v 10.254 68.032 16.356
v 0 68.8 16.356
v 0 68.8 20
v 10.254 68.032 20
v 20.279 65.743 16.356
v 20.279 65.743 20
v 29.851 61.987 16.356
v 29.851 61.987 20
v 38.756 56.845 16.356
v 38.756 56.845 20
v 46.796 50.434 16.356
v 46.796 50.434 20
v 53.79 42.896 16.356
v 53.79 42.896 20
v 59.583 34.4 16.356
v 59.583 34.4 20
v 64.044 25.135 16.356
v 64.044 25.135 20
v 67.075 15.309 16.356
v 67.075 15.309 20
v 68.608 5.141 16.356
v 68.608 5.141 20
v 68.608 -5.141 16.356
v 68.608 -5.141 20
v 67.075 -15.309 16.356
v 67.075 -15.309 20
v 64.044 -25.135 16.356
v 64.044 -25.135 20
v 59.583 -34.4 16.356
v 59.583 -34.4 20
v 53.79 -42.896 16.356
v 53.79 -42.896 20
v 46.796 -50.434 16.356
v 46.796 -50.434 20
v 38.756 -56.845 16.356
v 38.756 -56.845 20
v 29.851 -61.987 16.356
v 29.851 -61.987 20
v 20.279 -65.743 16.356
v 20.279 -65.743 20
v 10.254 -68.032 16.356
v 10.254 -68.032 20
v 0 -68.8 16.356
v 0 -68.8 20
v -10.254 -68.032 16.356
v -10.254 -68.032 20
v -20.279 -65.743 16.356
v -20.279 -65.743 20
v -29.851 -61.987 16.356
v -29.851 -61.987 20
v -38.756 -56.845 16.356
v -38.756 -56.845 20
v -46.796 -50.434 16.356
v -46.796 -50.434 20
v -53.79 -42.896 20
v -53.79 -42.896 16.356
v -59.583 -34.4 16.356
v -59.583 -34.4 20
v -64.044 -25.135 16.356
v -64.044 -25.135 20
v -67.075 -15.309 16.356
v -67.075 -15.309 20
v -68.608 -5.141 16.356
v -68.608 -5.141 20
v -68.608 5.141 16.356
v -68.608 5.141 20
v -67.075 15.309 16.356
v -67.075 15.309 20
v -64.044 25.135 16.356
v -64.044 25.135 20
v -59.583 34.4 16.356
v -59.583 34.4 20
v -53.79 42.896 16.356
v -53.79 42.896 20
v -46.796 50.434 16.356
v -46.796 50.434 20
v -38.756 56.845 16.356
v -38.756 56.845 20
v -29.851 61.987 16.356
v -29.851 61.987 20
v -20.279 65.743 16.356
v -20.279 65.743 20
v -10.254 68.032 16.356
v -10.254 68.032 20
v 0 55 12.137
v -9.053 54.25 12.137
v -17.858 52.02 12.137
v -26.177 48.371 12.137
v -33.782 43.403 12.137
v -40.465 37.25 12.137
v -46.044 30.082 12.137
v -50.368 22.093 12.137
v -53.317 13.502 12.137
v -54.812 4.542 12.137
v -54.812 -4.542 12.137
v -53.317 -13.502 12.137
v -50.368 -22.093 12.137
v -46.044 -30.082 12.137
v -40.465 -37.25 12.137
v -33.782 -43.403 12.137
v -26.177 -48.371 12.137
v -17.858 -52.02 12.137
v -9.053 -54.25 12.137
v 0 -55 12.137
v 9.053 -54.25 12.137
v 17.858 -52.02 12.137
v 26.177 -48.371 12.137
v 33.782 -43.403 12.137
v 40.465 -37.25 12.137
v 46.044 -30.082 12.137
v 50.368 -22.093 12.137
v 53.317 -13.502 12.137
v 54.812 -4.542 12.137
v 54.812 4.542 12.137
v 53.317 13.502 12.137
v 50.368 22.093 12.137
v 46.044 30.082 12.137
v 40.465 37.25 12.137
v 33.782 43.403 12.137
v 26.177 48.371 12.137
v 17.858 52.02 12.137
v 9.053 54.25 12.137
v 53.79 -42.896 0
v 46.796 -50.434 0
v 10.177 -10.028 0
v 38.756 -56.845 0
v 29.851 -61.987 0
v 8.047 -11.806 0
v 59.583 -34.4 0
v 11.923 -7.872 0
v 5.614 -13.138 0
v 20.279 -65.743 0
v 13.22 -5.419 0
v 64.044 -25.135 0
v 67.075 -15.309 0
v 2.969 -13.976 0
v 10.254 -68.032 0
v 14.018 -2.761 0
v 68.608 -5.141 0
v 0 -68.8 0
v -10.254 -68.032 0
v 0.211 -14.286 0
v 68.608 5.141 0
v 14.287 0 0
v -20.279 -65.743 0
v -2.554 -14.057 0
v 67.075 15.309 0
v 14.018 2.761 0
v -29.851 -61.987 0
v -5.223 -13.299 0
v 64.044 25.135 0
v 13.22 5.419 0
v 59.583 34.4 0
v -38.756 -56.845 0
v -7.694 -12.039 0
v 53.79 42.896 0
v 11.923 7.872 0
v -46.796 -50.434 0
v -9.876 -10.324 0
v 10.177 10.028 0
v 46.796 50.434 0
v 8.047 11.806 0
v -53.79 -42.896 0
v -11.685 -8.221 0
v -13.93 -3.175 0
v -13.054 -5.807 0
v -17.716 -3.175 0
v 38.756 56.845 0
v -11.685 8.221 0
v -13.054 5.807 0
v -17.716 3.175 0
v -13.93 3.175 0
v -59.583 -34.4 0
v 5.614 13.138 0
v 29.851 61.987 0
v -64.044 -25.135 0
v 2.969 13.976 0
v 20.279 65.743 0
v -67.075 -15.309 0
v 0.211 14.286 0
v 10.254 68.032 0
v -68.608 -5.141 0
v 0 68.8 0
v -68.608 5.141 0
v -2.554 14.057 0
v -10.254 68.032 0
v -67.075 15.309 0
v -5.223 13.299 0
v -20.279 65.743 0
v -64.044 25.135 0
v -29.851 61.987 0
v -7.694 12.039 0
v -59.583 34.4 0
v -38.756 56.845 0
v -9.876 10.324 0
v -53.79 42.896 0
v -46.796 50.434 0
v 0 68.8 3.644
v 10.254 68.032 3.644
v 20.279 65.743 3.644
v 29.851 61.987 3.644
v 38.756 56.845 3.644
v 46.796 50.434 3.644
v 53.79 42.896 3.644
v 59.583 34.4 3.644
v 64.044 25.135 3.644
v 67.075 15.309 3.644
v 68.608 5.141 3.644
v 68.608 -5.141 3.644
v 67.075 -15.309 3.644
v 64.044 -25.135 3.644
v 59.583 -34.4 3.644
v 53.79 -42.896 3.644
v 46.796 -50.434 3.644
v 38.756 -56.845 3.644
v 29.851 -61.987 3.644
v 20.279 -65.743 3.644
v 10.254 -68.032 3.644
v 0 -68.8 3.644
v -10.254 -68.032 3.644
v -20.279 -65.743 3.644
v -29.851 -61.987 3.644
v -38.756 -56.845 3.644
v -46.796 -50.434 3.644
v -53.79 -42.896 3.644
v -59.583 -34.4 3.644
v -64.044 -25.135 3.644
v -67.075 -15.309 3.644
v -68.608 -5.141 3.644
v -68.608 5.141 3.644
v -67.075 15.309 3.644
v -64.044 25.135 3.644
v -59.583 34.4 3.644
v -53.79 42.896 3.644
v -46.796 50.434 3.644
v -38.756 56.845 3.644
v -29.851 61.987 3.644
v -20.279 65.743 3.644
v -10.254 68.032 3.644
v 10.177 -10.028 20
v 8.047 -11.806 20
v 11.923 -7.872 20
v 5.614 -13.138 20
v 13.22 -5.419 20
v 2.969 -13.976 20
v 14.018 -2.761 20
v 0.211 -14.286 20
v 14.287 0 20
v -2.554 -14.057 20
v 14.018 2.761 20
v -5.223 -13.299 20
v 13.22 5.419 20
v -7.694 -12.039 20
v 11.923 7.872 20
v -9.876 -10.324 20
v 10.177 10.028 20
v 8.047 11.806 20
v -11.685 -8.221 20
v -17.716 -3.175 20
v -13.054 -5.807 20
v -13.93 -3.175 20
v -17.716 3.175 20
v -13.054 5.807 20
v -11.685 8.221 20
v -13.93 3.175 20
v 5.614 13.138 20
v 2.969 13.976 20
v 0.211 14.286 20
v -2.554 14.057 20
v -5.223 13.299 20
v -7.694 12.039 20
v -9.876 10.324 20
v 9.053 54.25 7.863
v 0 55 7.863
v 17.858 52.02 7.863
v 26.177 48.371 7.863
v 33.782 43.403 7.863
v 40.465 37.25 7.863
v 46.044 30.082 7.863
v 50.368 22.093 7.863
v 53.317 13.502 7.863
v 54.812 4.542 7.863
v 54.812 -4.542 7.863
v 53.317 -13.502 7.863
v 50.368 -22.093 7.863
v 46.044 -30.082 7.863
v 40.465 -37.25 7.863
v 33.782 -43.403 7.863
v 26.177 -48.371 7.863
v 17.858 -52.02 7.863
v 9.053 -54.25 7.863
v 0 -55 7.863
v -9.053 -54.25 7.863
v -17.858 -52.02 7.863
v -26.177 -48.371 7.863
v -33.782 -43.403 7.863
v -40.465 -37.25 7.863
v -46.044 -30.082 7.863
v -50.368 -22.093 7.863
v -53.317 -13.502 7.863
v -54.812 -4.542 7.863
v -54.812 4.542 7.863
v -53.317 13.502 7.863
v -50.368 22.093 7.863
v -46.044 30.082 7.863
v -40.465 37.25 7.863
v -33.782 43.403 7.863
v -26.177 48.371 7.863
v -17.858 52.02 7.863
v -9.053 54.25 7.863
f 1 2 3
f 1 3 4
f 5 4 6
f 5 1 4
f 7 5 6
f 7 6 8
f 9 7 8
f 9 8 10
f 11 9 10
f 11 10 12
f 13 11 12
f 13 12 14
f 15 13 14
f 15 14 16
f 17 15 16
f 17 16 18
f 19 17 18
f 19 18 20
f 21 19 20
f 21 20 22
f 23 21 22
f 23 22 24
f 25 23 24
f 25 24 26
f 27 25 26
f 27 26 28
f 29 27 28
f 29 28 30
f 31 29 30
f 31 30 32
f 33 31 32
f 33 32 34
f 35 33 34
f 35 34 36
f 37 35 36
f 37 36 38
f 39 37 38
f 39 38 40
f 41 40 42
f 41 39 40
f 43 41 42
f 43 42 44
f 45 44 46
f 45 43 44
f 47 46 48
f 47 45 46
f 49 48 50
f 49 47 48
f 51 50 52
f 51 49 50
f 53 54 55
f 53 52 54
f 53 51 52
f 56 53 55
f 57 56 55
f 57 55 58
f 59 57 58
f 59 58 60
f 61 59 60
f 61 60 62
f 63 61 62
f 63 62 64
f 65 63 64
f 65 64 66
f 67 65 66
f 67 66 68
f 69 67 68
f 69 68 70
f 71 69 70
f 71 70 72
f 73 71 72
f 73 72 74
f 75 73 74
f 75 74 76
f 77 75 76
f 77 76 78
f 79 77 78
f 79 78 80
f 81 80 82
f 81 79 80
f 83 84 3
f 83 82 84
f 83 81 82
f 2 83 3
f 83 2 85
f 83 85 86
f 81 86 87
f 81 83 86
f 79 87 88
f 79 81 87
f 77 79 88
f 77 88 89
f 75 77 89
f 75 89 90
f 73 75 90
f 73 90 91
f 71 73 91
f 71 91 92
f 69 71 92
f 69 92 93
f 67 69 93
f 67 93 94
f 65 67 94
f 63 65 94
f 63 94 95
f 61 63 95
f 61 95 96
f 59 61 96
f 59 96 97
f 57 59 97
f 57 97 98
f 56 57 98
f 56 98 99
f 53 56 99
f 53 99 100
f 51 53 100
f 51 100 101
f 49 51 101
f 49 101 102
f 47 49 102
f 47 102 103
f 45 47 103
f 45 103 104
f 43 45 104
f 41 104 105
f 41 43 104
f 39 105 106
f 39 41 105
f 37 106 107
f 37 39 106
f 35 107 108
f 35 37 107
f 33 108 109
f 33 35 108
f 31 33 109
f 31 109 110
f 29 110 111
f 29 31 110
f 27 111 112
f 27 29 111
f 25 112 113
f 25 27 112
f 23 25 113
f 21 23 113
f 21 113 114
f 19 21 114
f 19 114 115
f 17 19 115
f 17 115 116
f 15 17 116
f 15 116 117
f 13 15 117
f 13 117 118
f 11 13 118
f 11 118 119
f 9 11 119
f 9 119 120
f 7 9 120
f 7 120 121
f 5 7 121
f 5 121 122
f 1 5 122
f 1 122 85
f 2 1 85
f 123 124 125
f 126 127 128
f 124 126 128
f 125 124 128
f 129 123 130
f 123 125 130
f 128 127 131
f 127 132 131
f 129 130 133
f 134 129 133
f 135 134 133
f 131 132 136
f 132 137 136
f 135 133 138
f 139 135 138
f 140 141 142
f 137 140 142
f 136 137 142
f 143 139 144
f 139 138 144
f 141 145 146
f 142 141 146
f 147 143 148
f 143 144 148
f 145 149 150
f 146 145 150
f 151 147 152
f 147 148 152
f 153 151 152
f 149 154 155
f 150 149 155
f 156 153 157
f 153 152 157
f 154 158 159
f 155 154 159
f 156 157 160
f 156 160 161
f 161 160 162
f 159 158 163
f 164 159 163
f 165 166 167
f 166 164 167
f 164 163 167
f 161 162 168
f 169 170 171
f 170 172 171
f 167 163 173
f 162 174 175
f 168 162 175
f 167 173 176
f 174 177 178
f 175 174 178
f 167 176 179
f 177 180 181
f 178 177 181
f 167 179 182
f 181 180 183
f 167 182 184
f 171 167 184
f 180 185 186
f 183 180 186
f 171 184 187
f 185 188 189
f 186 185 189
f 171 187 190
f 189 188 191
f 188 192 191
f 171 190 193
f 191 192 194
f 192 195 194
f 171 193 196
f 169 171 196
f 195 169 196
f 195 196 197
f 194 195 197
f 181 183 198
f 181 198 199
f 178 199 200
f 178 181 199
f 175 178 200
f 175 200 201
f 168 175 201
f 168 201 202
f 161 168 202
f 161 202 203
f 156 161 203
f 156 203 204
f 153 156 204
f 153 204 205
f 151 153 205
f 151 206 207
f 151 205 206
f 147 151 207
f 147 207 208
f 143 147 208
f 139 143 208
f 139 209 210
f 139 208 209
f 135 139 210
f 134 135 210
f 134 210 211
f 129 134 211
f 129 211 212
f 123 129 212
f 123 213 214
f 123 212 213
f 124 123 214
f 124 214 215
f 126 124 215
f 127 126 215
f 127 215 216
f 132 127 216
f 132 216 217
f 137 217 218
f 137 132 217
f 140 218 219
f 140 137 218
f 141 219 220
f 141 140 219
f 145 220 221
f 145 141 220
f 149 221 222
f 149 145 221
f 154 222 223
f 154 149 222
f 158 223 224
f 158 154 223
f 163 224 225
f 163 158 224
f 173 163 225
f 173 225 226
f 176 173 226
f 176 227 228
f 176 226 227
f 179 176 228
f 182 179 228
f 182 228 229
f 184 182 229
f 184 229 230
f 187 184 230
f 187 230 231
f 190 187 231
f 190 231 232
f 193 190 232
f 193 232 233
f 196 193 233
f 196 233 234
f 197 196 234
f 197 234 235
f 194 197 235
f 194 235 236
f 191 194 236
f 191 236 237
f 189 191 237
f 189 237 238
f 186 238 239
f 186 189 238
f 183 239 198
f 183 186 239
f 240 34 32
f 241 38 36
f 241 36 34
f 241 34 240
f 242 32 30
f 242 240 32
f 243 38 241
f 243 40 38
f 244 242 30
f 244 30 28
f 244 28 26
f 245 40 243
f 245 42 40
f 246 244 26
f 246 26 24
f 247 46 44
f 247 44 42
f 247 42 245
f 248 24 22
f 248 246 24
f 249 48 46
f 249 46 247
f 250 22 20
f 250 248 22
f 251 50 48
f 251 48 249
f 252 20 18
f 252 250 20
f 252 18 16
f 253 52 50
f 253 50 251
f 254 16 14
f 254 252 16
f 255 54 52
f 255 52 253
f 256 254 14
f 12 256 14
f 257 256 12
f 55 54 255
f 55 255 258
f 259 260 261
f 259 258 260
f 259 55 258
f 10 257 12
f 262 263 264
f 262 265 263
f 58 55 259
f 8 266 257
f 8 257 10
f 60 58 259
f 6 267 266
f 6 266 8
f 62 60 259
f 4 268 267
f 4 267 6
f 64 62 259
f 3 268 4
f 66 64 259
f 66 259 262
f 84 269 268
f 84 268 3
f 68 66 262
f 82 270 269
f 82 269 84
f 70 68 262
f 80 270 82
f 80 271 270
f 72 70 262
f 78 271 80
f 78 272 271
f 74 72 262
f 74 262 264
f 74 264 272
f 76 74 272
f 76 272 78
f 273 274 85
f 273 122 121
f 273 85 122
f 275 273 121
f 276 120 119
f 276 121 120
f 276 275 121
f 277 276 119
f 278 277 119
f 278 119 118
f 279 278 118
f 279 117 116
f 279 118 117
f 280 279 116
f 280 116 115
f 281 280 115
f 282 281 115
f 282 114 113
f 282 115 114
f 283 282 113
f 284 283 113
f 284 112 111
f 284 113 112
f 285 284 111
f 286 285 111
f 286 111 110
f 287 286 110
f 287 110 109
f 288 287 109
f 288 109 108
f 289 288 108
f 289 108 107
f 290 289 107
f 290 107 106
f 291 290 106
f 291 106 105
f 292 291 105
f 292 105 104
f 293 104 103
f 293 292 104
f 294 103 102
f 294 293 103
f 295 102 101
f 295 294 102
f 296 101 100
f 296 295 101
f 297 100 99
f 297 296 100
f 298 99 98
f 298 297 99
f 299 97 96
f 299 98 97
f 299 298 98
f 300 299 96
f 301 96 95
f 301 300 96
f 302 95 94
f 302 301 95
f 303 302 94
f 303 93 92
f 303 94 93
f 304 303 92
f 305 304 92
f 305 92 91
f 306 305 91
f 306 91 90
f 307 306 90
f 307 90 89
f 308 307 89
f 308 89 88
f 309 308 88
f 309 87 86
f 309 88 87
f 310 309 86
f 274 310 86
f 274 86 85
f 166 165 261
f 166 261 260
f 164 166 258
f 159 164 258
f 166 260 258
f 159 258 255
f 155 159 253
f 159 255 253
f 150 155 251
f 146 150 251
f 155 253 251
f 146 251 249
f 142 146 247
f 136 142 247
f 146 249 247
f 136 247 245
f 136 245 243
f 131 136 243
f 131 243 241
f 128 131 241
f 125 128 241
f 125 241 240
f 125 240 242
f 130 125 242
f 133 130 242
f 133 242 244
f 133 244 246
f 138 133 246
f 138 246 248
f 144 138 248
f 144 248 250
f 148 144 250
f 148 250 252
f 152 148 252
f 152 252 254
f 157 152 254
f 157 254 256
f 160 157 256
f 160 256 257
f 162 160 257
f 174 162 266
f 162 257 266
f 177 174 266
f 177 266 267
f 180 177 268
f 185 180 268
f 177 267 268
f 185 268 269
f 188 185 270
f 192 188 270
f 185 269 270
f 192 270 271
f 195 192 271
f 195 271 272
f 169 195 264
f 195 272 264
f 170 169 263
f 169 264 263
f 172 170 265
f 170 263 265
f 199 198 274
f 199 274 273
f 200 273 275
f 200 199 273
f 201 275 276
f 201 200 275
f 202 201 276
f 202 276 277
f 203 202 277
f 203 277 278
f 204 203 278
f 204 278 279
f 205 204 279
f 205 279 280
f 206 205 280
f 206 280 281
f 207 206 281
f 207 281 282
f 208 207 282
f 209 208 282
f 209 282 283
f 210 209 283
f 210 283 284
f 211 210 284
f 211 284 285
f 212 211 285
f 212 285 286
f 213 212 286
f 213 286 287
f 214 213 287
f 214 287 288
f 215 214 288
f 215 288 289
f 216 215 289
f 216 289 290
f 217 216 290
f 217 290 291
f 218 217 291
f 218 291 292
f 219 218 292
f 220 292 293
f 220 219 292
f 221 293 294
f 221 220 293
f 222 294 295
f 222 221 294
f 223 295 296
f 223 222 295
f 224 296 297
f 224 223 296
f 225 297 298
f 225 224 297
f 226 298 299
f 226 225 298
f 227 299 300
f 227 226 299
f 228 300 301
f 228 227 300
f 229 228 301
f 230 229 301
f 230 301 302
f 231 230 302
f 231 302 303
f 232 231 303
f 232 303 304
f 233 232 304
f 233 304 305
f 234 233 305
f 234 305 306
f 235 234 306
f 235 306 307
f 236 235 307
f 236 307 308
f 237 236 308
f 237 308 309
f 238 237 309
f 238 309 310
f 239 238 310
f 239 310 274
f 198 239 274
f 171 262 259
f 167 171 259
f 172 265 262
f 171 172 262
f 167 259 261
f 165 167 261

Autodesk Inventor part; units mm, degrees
ref_plane "YZ Plane" through (0, 0, 0) normal (1, 0, 0) x (0, 1, 0)
ref_plane "XZ Plane" through (0, 0, 0) normal (0, 1, 0) x (-1, 0, 0)
sketch "Boceto principal" plane through (0, 0, 0) normal (1, 0, 0) x (0, 1, 0)
  line L0 (0, 20) -> (68.8, 20)
  line L1 (68.8, 20) -> (68.8, 16.356)
  line L2 (68.8, 16.356) -> (55, 12.137)
  line L3 (55, 12.137) -> (55, 7.863)
  line L4 (55, 7.863) -> (68.8, 3.644)
  line L5 (68.8, 3.644) -> (68.8, 0)
  line L6 (68.8, 0) -> (0, 0)
  line L7 (66, 15.5) -> (66, 4.5) construction
  line L8 (55, 10) -> (66, 10) construction
  line L9 (68.8, 16.356) -> (68.8, 3.644)
  line L10 (0, -4) -> (0, 24) projected
  line L11 (0, 0) -> (0, 20)
  dimension "d0" = 11
  dimension "d1" = 34
  dimension "d2" = 2.8
  dimension "d6" = 20
  dimension "d21" = 132
  dimension "d25" = 13.8
  dimension "d27" = 10
ref_plane "Plano de correa" through (0, 55, 10) normal (0, 0, 1) x (1, 0, 0)
revolve "Cuerpo" add sketch "Boceto principal" angle 360 about axis through (0, 0, -10) along (0, 0, 1)
revolve "Para ranuras" cut sketch "Boceto principal" angle 360 about axis through (0, 0, -10) along (0, 0, 1) contours L9 L4 L3 L2
fillet "Empalme externo" [suppressed]
fillet "Empalme interno" [suppressed]
pattern_of_one "Patrón para ranuras"
sketch "Boceto2" plane through (0, 0, 20) normal (0, 0, 1) x (1, 0, 0)
  arc A0 (-14.0634, -2.5203) -> (-14.0634, 2.5203) centre (0, 0) ccw
  line L0 (-17.7165, -3.175) -> (-13.9303, -3.175)
  line L1 (-13.9303, 3.175) -> (-17.7165, 3.175)
  line L2 (-17.7165, 3.175) -> (-17.7165, -3.175)
  line L3 (-17.7165, -3.175) -> (17.7165, 3.175) construction
  line L4 (17.7165, -3.175) -> (-17.7165, 3.175) construction
  dimension "d28" = 28.575
extrude "Extrusión1" cut sketch "Boceto2" against normal blind 20
equation "\"d0\" = da_Bw"
equation "\"d1\" = da_Alfa"
equation "\"d2\" = da_c"
equation "\"d21\" = da_Dw"
equation "\"d25\" = da_Hd"
equation "\"d27\" = da_Se"
equation "\"da_r1\" = 0"
equation "\"da_r2\" = 0"
equation "\"d18\" = da_Sg"
equation "\"da_Bw\" = 11"
equation "\"da_Alfa\" = 34deg"
equation "\"da_c\" = 2.8"
equation "\"da_Dw\" = 132"
equation "\"da_Hd\" = 13.8"
equation "\"da_Se\" = 10"
equation "\"da_Sg\" = 15"
properties part number "Polea ranurada1" material "Steel"
